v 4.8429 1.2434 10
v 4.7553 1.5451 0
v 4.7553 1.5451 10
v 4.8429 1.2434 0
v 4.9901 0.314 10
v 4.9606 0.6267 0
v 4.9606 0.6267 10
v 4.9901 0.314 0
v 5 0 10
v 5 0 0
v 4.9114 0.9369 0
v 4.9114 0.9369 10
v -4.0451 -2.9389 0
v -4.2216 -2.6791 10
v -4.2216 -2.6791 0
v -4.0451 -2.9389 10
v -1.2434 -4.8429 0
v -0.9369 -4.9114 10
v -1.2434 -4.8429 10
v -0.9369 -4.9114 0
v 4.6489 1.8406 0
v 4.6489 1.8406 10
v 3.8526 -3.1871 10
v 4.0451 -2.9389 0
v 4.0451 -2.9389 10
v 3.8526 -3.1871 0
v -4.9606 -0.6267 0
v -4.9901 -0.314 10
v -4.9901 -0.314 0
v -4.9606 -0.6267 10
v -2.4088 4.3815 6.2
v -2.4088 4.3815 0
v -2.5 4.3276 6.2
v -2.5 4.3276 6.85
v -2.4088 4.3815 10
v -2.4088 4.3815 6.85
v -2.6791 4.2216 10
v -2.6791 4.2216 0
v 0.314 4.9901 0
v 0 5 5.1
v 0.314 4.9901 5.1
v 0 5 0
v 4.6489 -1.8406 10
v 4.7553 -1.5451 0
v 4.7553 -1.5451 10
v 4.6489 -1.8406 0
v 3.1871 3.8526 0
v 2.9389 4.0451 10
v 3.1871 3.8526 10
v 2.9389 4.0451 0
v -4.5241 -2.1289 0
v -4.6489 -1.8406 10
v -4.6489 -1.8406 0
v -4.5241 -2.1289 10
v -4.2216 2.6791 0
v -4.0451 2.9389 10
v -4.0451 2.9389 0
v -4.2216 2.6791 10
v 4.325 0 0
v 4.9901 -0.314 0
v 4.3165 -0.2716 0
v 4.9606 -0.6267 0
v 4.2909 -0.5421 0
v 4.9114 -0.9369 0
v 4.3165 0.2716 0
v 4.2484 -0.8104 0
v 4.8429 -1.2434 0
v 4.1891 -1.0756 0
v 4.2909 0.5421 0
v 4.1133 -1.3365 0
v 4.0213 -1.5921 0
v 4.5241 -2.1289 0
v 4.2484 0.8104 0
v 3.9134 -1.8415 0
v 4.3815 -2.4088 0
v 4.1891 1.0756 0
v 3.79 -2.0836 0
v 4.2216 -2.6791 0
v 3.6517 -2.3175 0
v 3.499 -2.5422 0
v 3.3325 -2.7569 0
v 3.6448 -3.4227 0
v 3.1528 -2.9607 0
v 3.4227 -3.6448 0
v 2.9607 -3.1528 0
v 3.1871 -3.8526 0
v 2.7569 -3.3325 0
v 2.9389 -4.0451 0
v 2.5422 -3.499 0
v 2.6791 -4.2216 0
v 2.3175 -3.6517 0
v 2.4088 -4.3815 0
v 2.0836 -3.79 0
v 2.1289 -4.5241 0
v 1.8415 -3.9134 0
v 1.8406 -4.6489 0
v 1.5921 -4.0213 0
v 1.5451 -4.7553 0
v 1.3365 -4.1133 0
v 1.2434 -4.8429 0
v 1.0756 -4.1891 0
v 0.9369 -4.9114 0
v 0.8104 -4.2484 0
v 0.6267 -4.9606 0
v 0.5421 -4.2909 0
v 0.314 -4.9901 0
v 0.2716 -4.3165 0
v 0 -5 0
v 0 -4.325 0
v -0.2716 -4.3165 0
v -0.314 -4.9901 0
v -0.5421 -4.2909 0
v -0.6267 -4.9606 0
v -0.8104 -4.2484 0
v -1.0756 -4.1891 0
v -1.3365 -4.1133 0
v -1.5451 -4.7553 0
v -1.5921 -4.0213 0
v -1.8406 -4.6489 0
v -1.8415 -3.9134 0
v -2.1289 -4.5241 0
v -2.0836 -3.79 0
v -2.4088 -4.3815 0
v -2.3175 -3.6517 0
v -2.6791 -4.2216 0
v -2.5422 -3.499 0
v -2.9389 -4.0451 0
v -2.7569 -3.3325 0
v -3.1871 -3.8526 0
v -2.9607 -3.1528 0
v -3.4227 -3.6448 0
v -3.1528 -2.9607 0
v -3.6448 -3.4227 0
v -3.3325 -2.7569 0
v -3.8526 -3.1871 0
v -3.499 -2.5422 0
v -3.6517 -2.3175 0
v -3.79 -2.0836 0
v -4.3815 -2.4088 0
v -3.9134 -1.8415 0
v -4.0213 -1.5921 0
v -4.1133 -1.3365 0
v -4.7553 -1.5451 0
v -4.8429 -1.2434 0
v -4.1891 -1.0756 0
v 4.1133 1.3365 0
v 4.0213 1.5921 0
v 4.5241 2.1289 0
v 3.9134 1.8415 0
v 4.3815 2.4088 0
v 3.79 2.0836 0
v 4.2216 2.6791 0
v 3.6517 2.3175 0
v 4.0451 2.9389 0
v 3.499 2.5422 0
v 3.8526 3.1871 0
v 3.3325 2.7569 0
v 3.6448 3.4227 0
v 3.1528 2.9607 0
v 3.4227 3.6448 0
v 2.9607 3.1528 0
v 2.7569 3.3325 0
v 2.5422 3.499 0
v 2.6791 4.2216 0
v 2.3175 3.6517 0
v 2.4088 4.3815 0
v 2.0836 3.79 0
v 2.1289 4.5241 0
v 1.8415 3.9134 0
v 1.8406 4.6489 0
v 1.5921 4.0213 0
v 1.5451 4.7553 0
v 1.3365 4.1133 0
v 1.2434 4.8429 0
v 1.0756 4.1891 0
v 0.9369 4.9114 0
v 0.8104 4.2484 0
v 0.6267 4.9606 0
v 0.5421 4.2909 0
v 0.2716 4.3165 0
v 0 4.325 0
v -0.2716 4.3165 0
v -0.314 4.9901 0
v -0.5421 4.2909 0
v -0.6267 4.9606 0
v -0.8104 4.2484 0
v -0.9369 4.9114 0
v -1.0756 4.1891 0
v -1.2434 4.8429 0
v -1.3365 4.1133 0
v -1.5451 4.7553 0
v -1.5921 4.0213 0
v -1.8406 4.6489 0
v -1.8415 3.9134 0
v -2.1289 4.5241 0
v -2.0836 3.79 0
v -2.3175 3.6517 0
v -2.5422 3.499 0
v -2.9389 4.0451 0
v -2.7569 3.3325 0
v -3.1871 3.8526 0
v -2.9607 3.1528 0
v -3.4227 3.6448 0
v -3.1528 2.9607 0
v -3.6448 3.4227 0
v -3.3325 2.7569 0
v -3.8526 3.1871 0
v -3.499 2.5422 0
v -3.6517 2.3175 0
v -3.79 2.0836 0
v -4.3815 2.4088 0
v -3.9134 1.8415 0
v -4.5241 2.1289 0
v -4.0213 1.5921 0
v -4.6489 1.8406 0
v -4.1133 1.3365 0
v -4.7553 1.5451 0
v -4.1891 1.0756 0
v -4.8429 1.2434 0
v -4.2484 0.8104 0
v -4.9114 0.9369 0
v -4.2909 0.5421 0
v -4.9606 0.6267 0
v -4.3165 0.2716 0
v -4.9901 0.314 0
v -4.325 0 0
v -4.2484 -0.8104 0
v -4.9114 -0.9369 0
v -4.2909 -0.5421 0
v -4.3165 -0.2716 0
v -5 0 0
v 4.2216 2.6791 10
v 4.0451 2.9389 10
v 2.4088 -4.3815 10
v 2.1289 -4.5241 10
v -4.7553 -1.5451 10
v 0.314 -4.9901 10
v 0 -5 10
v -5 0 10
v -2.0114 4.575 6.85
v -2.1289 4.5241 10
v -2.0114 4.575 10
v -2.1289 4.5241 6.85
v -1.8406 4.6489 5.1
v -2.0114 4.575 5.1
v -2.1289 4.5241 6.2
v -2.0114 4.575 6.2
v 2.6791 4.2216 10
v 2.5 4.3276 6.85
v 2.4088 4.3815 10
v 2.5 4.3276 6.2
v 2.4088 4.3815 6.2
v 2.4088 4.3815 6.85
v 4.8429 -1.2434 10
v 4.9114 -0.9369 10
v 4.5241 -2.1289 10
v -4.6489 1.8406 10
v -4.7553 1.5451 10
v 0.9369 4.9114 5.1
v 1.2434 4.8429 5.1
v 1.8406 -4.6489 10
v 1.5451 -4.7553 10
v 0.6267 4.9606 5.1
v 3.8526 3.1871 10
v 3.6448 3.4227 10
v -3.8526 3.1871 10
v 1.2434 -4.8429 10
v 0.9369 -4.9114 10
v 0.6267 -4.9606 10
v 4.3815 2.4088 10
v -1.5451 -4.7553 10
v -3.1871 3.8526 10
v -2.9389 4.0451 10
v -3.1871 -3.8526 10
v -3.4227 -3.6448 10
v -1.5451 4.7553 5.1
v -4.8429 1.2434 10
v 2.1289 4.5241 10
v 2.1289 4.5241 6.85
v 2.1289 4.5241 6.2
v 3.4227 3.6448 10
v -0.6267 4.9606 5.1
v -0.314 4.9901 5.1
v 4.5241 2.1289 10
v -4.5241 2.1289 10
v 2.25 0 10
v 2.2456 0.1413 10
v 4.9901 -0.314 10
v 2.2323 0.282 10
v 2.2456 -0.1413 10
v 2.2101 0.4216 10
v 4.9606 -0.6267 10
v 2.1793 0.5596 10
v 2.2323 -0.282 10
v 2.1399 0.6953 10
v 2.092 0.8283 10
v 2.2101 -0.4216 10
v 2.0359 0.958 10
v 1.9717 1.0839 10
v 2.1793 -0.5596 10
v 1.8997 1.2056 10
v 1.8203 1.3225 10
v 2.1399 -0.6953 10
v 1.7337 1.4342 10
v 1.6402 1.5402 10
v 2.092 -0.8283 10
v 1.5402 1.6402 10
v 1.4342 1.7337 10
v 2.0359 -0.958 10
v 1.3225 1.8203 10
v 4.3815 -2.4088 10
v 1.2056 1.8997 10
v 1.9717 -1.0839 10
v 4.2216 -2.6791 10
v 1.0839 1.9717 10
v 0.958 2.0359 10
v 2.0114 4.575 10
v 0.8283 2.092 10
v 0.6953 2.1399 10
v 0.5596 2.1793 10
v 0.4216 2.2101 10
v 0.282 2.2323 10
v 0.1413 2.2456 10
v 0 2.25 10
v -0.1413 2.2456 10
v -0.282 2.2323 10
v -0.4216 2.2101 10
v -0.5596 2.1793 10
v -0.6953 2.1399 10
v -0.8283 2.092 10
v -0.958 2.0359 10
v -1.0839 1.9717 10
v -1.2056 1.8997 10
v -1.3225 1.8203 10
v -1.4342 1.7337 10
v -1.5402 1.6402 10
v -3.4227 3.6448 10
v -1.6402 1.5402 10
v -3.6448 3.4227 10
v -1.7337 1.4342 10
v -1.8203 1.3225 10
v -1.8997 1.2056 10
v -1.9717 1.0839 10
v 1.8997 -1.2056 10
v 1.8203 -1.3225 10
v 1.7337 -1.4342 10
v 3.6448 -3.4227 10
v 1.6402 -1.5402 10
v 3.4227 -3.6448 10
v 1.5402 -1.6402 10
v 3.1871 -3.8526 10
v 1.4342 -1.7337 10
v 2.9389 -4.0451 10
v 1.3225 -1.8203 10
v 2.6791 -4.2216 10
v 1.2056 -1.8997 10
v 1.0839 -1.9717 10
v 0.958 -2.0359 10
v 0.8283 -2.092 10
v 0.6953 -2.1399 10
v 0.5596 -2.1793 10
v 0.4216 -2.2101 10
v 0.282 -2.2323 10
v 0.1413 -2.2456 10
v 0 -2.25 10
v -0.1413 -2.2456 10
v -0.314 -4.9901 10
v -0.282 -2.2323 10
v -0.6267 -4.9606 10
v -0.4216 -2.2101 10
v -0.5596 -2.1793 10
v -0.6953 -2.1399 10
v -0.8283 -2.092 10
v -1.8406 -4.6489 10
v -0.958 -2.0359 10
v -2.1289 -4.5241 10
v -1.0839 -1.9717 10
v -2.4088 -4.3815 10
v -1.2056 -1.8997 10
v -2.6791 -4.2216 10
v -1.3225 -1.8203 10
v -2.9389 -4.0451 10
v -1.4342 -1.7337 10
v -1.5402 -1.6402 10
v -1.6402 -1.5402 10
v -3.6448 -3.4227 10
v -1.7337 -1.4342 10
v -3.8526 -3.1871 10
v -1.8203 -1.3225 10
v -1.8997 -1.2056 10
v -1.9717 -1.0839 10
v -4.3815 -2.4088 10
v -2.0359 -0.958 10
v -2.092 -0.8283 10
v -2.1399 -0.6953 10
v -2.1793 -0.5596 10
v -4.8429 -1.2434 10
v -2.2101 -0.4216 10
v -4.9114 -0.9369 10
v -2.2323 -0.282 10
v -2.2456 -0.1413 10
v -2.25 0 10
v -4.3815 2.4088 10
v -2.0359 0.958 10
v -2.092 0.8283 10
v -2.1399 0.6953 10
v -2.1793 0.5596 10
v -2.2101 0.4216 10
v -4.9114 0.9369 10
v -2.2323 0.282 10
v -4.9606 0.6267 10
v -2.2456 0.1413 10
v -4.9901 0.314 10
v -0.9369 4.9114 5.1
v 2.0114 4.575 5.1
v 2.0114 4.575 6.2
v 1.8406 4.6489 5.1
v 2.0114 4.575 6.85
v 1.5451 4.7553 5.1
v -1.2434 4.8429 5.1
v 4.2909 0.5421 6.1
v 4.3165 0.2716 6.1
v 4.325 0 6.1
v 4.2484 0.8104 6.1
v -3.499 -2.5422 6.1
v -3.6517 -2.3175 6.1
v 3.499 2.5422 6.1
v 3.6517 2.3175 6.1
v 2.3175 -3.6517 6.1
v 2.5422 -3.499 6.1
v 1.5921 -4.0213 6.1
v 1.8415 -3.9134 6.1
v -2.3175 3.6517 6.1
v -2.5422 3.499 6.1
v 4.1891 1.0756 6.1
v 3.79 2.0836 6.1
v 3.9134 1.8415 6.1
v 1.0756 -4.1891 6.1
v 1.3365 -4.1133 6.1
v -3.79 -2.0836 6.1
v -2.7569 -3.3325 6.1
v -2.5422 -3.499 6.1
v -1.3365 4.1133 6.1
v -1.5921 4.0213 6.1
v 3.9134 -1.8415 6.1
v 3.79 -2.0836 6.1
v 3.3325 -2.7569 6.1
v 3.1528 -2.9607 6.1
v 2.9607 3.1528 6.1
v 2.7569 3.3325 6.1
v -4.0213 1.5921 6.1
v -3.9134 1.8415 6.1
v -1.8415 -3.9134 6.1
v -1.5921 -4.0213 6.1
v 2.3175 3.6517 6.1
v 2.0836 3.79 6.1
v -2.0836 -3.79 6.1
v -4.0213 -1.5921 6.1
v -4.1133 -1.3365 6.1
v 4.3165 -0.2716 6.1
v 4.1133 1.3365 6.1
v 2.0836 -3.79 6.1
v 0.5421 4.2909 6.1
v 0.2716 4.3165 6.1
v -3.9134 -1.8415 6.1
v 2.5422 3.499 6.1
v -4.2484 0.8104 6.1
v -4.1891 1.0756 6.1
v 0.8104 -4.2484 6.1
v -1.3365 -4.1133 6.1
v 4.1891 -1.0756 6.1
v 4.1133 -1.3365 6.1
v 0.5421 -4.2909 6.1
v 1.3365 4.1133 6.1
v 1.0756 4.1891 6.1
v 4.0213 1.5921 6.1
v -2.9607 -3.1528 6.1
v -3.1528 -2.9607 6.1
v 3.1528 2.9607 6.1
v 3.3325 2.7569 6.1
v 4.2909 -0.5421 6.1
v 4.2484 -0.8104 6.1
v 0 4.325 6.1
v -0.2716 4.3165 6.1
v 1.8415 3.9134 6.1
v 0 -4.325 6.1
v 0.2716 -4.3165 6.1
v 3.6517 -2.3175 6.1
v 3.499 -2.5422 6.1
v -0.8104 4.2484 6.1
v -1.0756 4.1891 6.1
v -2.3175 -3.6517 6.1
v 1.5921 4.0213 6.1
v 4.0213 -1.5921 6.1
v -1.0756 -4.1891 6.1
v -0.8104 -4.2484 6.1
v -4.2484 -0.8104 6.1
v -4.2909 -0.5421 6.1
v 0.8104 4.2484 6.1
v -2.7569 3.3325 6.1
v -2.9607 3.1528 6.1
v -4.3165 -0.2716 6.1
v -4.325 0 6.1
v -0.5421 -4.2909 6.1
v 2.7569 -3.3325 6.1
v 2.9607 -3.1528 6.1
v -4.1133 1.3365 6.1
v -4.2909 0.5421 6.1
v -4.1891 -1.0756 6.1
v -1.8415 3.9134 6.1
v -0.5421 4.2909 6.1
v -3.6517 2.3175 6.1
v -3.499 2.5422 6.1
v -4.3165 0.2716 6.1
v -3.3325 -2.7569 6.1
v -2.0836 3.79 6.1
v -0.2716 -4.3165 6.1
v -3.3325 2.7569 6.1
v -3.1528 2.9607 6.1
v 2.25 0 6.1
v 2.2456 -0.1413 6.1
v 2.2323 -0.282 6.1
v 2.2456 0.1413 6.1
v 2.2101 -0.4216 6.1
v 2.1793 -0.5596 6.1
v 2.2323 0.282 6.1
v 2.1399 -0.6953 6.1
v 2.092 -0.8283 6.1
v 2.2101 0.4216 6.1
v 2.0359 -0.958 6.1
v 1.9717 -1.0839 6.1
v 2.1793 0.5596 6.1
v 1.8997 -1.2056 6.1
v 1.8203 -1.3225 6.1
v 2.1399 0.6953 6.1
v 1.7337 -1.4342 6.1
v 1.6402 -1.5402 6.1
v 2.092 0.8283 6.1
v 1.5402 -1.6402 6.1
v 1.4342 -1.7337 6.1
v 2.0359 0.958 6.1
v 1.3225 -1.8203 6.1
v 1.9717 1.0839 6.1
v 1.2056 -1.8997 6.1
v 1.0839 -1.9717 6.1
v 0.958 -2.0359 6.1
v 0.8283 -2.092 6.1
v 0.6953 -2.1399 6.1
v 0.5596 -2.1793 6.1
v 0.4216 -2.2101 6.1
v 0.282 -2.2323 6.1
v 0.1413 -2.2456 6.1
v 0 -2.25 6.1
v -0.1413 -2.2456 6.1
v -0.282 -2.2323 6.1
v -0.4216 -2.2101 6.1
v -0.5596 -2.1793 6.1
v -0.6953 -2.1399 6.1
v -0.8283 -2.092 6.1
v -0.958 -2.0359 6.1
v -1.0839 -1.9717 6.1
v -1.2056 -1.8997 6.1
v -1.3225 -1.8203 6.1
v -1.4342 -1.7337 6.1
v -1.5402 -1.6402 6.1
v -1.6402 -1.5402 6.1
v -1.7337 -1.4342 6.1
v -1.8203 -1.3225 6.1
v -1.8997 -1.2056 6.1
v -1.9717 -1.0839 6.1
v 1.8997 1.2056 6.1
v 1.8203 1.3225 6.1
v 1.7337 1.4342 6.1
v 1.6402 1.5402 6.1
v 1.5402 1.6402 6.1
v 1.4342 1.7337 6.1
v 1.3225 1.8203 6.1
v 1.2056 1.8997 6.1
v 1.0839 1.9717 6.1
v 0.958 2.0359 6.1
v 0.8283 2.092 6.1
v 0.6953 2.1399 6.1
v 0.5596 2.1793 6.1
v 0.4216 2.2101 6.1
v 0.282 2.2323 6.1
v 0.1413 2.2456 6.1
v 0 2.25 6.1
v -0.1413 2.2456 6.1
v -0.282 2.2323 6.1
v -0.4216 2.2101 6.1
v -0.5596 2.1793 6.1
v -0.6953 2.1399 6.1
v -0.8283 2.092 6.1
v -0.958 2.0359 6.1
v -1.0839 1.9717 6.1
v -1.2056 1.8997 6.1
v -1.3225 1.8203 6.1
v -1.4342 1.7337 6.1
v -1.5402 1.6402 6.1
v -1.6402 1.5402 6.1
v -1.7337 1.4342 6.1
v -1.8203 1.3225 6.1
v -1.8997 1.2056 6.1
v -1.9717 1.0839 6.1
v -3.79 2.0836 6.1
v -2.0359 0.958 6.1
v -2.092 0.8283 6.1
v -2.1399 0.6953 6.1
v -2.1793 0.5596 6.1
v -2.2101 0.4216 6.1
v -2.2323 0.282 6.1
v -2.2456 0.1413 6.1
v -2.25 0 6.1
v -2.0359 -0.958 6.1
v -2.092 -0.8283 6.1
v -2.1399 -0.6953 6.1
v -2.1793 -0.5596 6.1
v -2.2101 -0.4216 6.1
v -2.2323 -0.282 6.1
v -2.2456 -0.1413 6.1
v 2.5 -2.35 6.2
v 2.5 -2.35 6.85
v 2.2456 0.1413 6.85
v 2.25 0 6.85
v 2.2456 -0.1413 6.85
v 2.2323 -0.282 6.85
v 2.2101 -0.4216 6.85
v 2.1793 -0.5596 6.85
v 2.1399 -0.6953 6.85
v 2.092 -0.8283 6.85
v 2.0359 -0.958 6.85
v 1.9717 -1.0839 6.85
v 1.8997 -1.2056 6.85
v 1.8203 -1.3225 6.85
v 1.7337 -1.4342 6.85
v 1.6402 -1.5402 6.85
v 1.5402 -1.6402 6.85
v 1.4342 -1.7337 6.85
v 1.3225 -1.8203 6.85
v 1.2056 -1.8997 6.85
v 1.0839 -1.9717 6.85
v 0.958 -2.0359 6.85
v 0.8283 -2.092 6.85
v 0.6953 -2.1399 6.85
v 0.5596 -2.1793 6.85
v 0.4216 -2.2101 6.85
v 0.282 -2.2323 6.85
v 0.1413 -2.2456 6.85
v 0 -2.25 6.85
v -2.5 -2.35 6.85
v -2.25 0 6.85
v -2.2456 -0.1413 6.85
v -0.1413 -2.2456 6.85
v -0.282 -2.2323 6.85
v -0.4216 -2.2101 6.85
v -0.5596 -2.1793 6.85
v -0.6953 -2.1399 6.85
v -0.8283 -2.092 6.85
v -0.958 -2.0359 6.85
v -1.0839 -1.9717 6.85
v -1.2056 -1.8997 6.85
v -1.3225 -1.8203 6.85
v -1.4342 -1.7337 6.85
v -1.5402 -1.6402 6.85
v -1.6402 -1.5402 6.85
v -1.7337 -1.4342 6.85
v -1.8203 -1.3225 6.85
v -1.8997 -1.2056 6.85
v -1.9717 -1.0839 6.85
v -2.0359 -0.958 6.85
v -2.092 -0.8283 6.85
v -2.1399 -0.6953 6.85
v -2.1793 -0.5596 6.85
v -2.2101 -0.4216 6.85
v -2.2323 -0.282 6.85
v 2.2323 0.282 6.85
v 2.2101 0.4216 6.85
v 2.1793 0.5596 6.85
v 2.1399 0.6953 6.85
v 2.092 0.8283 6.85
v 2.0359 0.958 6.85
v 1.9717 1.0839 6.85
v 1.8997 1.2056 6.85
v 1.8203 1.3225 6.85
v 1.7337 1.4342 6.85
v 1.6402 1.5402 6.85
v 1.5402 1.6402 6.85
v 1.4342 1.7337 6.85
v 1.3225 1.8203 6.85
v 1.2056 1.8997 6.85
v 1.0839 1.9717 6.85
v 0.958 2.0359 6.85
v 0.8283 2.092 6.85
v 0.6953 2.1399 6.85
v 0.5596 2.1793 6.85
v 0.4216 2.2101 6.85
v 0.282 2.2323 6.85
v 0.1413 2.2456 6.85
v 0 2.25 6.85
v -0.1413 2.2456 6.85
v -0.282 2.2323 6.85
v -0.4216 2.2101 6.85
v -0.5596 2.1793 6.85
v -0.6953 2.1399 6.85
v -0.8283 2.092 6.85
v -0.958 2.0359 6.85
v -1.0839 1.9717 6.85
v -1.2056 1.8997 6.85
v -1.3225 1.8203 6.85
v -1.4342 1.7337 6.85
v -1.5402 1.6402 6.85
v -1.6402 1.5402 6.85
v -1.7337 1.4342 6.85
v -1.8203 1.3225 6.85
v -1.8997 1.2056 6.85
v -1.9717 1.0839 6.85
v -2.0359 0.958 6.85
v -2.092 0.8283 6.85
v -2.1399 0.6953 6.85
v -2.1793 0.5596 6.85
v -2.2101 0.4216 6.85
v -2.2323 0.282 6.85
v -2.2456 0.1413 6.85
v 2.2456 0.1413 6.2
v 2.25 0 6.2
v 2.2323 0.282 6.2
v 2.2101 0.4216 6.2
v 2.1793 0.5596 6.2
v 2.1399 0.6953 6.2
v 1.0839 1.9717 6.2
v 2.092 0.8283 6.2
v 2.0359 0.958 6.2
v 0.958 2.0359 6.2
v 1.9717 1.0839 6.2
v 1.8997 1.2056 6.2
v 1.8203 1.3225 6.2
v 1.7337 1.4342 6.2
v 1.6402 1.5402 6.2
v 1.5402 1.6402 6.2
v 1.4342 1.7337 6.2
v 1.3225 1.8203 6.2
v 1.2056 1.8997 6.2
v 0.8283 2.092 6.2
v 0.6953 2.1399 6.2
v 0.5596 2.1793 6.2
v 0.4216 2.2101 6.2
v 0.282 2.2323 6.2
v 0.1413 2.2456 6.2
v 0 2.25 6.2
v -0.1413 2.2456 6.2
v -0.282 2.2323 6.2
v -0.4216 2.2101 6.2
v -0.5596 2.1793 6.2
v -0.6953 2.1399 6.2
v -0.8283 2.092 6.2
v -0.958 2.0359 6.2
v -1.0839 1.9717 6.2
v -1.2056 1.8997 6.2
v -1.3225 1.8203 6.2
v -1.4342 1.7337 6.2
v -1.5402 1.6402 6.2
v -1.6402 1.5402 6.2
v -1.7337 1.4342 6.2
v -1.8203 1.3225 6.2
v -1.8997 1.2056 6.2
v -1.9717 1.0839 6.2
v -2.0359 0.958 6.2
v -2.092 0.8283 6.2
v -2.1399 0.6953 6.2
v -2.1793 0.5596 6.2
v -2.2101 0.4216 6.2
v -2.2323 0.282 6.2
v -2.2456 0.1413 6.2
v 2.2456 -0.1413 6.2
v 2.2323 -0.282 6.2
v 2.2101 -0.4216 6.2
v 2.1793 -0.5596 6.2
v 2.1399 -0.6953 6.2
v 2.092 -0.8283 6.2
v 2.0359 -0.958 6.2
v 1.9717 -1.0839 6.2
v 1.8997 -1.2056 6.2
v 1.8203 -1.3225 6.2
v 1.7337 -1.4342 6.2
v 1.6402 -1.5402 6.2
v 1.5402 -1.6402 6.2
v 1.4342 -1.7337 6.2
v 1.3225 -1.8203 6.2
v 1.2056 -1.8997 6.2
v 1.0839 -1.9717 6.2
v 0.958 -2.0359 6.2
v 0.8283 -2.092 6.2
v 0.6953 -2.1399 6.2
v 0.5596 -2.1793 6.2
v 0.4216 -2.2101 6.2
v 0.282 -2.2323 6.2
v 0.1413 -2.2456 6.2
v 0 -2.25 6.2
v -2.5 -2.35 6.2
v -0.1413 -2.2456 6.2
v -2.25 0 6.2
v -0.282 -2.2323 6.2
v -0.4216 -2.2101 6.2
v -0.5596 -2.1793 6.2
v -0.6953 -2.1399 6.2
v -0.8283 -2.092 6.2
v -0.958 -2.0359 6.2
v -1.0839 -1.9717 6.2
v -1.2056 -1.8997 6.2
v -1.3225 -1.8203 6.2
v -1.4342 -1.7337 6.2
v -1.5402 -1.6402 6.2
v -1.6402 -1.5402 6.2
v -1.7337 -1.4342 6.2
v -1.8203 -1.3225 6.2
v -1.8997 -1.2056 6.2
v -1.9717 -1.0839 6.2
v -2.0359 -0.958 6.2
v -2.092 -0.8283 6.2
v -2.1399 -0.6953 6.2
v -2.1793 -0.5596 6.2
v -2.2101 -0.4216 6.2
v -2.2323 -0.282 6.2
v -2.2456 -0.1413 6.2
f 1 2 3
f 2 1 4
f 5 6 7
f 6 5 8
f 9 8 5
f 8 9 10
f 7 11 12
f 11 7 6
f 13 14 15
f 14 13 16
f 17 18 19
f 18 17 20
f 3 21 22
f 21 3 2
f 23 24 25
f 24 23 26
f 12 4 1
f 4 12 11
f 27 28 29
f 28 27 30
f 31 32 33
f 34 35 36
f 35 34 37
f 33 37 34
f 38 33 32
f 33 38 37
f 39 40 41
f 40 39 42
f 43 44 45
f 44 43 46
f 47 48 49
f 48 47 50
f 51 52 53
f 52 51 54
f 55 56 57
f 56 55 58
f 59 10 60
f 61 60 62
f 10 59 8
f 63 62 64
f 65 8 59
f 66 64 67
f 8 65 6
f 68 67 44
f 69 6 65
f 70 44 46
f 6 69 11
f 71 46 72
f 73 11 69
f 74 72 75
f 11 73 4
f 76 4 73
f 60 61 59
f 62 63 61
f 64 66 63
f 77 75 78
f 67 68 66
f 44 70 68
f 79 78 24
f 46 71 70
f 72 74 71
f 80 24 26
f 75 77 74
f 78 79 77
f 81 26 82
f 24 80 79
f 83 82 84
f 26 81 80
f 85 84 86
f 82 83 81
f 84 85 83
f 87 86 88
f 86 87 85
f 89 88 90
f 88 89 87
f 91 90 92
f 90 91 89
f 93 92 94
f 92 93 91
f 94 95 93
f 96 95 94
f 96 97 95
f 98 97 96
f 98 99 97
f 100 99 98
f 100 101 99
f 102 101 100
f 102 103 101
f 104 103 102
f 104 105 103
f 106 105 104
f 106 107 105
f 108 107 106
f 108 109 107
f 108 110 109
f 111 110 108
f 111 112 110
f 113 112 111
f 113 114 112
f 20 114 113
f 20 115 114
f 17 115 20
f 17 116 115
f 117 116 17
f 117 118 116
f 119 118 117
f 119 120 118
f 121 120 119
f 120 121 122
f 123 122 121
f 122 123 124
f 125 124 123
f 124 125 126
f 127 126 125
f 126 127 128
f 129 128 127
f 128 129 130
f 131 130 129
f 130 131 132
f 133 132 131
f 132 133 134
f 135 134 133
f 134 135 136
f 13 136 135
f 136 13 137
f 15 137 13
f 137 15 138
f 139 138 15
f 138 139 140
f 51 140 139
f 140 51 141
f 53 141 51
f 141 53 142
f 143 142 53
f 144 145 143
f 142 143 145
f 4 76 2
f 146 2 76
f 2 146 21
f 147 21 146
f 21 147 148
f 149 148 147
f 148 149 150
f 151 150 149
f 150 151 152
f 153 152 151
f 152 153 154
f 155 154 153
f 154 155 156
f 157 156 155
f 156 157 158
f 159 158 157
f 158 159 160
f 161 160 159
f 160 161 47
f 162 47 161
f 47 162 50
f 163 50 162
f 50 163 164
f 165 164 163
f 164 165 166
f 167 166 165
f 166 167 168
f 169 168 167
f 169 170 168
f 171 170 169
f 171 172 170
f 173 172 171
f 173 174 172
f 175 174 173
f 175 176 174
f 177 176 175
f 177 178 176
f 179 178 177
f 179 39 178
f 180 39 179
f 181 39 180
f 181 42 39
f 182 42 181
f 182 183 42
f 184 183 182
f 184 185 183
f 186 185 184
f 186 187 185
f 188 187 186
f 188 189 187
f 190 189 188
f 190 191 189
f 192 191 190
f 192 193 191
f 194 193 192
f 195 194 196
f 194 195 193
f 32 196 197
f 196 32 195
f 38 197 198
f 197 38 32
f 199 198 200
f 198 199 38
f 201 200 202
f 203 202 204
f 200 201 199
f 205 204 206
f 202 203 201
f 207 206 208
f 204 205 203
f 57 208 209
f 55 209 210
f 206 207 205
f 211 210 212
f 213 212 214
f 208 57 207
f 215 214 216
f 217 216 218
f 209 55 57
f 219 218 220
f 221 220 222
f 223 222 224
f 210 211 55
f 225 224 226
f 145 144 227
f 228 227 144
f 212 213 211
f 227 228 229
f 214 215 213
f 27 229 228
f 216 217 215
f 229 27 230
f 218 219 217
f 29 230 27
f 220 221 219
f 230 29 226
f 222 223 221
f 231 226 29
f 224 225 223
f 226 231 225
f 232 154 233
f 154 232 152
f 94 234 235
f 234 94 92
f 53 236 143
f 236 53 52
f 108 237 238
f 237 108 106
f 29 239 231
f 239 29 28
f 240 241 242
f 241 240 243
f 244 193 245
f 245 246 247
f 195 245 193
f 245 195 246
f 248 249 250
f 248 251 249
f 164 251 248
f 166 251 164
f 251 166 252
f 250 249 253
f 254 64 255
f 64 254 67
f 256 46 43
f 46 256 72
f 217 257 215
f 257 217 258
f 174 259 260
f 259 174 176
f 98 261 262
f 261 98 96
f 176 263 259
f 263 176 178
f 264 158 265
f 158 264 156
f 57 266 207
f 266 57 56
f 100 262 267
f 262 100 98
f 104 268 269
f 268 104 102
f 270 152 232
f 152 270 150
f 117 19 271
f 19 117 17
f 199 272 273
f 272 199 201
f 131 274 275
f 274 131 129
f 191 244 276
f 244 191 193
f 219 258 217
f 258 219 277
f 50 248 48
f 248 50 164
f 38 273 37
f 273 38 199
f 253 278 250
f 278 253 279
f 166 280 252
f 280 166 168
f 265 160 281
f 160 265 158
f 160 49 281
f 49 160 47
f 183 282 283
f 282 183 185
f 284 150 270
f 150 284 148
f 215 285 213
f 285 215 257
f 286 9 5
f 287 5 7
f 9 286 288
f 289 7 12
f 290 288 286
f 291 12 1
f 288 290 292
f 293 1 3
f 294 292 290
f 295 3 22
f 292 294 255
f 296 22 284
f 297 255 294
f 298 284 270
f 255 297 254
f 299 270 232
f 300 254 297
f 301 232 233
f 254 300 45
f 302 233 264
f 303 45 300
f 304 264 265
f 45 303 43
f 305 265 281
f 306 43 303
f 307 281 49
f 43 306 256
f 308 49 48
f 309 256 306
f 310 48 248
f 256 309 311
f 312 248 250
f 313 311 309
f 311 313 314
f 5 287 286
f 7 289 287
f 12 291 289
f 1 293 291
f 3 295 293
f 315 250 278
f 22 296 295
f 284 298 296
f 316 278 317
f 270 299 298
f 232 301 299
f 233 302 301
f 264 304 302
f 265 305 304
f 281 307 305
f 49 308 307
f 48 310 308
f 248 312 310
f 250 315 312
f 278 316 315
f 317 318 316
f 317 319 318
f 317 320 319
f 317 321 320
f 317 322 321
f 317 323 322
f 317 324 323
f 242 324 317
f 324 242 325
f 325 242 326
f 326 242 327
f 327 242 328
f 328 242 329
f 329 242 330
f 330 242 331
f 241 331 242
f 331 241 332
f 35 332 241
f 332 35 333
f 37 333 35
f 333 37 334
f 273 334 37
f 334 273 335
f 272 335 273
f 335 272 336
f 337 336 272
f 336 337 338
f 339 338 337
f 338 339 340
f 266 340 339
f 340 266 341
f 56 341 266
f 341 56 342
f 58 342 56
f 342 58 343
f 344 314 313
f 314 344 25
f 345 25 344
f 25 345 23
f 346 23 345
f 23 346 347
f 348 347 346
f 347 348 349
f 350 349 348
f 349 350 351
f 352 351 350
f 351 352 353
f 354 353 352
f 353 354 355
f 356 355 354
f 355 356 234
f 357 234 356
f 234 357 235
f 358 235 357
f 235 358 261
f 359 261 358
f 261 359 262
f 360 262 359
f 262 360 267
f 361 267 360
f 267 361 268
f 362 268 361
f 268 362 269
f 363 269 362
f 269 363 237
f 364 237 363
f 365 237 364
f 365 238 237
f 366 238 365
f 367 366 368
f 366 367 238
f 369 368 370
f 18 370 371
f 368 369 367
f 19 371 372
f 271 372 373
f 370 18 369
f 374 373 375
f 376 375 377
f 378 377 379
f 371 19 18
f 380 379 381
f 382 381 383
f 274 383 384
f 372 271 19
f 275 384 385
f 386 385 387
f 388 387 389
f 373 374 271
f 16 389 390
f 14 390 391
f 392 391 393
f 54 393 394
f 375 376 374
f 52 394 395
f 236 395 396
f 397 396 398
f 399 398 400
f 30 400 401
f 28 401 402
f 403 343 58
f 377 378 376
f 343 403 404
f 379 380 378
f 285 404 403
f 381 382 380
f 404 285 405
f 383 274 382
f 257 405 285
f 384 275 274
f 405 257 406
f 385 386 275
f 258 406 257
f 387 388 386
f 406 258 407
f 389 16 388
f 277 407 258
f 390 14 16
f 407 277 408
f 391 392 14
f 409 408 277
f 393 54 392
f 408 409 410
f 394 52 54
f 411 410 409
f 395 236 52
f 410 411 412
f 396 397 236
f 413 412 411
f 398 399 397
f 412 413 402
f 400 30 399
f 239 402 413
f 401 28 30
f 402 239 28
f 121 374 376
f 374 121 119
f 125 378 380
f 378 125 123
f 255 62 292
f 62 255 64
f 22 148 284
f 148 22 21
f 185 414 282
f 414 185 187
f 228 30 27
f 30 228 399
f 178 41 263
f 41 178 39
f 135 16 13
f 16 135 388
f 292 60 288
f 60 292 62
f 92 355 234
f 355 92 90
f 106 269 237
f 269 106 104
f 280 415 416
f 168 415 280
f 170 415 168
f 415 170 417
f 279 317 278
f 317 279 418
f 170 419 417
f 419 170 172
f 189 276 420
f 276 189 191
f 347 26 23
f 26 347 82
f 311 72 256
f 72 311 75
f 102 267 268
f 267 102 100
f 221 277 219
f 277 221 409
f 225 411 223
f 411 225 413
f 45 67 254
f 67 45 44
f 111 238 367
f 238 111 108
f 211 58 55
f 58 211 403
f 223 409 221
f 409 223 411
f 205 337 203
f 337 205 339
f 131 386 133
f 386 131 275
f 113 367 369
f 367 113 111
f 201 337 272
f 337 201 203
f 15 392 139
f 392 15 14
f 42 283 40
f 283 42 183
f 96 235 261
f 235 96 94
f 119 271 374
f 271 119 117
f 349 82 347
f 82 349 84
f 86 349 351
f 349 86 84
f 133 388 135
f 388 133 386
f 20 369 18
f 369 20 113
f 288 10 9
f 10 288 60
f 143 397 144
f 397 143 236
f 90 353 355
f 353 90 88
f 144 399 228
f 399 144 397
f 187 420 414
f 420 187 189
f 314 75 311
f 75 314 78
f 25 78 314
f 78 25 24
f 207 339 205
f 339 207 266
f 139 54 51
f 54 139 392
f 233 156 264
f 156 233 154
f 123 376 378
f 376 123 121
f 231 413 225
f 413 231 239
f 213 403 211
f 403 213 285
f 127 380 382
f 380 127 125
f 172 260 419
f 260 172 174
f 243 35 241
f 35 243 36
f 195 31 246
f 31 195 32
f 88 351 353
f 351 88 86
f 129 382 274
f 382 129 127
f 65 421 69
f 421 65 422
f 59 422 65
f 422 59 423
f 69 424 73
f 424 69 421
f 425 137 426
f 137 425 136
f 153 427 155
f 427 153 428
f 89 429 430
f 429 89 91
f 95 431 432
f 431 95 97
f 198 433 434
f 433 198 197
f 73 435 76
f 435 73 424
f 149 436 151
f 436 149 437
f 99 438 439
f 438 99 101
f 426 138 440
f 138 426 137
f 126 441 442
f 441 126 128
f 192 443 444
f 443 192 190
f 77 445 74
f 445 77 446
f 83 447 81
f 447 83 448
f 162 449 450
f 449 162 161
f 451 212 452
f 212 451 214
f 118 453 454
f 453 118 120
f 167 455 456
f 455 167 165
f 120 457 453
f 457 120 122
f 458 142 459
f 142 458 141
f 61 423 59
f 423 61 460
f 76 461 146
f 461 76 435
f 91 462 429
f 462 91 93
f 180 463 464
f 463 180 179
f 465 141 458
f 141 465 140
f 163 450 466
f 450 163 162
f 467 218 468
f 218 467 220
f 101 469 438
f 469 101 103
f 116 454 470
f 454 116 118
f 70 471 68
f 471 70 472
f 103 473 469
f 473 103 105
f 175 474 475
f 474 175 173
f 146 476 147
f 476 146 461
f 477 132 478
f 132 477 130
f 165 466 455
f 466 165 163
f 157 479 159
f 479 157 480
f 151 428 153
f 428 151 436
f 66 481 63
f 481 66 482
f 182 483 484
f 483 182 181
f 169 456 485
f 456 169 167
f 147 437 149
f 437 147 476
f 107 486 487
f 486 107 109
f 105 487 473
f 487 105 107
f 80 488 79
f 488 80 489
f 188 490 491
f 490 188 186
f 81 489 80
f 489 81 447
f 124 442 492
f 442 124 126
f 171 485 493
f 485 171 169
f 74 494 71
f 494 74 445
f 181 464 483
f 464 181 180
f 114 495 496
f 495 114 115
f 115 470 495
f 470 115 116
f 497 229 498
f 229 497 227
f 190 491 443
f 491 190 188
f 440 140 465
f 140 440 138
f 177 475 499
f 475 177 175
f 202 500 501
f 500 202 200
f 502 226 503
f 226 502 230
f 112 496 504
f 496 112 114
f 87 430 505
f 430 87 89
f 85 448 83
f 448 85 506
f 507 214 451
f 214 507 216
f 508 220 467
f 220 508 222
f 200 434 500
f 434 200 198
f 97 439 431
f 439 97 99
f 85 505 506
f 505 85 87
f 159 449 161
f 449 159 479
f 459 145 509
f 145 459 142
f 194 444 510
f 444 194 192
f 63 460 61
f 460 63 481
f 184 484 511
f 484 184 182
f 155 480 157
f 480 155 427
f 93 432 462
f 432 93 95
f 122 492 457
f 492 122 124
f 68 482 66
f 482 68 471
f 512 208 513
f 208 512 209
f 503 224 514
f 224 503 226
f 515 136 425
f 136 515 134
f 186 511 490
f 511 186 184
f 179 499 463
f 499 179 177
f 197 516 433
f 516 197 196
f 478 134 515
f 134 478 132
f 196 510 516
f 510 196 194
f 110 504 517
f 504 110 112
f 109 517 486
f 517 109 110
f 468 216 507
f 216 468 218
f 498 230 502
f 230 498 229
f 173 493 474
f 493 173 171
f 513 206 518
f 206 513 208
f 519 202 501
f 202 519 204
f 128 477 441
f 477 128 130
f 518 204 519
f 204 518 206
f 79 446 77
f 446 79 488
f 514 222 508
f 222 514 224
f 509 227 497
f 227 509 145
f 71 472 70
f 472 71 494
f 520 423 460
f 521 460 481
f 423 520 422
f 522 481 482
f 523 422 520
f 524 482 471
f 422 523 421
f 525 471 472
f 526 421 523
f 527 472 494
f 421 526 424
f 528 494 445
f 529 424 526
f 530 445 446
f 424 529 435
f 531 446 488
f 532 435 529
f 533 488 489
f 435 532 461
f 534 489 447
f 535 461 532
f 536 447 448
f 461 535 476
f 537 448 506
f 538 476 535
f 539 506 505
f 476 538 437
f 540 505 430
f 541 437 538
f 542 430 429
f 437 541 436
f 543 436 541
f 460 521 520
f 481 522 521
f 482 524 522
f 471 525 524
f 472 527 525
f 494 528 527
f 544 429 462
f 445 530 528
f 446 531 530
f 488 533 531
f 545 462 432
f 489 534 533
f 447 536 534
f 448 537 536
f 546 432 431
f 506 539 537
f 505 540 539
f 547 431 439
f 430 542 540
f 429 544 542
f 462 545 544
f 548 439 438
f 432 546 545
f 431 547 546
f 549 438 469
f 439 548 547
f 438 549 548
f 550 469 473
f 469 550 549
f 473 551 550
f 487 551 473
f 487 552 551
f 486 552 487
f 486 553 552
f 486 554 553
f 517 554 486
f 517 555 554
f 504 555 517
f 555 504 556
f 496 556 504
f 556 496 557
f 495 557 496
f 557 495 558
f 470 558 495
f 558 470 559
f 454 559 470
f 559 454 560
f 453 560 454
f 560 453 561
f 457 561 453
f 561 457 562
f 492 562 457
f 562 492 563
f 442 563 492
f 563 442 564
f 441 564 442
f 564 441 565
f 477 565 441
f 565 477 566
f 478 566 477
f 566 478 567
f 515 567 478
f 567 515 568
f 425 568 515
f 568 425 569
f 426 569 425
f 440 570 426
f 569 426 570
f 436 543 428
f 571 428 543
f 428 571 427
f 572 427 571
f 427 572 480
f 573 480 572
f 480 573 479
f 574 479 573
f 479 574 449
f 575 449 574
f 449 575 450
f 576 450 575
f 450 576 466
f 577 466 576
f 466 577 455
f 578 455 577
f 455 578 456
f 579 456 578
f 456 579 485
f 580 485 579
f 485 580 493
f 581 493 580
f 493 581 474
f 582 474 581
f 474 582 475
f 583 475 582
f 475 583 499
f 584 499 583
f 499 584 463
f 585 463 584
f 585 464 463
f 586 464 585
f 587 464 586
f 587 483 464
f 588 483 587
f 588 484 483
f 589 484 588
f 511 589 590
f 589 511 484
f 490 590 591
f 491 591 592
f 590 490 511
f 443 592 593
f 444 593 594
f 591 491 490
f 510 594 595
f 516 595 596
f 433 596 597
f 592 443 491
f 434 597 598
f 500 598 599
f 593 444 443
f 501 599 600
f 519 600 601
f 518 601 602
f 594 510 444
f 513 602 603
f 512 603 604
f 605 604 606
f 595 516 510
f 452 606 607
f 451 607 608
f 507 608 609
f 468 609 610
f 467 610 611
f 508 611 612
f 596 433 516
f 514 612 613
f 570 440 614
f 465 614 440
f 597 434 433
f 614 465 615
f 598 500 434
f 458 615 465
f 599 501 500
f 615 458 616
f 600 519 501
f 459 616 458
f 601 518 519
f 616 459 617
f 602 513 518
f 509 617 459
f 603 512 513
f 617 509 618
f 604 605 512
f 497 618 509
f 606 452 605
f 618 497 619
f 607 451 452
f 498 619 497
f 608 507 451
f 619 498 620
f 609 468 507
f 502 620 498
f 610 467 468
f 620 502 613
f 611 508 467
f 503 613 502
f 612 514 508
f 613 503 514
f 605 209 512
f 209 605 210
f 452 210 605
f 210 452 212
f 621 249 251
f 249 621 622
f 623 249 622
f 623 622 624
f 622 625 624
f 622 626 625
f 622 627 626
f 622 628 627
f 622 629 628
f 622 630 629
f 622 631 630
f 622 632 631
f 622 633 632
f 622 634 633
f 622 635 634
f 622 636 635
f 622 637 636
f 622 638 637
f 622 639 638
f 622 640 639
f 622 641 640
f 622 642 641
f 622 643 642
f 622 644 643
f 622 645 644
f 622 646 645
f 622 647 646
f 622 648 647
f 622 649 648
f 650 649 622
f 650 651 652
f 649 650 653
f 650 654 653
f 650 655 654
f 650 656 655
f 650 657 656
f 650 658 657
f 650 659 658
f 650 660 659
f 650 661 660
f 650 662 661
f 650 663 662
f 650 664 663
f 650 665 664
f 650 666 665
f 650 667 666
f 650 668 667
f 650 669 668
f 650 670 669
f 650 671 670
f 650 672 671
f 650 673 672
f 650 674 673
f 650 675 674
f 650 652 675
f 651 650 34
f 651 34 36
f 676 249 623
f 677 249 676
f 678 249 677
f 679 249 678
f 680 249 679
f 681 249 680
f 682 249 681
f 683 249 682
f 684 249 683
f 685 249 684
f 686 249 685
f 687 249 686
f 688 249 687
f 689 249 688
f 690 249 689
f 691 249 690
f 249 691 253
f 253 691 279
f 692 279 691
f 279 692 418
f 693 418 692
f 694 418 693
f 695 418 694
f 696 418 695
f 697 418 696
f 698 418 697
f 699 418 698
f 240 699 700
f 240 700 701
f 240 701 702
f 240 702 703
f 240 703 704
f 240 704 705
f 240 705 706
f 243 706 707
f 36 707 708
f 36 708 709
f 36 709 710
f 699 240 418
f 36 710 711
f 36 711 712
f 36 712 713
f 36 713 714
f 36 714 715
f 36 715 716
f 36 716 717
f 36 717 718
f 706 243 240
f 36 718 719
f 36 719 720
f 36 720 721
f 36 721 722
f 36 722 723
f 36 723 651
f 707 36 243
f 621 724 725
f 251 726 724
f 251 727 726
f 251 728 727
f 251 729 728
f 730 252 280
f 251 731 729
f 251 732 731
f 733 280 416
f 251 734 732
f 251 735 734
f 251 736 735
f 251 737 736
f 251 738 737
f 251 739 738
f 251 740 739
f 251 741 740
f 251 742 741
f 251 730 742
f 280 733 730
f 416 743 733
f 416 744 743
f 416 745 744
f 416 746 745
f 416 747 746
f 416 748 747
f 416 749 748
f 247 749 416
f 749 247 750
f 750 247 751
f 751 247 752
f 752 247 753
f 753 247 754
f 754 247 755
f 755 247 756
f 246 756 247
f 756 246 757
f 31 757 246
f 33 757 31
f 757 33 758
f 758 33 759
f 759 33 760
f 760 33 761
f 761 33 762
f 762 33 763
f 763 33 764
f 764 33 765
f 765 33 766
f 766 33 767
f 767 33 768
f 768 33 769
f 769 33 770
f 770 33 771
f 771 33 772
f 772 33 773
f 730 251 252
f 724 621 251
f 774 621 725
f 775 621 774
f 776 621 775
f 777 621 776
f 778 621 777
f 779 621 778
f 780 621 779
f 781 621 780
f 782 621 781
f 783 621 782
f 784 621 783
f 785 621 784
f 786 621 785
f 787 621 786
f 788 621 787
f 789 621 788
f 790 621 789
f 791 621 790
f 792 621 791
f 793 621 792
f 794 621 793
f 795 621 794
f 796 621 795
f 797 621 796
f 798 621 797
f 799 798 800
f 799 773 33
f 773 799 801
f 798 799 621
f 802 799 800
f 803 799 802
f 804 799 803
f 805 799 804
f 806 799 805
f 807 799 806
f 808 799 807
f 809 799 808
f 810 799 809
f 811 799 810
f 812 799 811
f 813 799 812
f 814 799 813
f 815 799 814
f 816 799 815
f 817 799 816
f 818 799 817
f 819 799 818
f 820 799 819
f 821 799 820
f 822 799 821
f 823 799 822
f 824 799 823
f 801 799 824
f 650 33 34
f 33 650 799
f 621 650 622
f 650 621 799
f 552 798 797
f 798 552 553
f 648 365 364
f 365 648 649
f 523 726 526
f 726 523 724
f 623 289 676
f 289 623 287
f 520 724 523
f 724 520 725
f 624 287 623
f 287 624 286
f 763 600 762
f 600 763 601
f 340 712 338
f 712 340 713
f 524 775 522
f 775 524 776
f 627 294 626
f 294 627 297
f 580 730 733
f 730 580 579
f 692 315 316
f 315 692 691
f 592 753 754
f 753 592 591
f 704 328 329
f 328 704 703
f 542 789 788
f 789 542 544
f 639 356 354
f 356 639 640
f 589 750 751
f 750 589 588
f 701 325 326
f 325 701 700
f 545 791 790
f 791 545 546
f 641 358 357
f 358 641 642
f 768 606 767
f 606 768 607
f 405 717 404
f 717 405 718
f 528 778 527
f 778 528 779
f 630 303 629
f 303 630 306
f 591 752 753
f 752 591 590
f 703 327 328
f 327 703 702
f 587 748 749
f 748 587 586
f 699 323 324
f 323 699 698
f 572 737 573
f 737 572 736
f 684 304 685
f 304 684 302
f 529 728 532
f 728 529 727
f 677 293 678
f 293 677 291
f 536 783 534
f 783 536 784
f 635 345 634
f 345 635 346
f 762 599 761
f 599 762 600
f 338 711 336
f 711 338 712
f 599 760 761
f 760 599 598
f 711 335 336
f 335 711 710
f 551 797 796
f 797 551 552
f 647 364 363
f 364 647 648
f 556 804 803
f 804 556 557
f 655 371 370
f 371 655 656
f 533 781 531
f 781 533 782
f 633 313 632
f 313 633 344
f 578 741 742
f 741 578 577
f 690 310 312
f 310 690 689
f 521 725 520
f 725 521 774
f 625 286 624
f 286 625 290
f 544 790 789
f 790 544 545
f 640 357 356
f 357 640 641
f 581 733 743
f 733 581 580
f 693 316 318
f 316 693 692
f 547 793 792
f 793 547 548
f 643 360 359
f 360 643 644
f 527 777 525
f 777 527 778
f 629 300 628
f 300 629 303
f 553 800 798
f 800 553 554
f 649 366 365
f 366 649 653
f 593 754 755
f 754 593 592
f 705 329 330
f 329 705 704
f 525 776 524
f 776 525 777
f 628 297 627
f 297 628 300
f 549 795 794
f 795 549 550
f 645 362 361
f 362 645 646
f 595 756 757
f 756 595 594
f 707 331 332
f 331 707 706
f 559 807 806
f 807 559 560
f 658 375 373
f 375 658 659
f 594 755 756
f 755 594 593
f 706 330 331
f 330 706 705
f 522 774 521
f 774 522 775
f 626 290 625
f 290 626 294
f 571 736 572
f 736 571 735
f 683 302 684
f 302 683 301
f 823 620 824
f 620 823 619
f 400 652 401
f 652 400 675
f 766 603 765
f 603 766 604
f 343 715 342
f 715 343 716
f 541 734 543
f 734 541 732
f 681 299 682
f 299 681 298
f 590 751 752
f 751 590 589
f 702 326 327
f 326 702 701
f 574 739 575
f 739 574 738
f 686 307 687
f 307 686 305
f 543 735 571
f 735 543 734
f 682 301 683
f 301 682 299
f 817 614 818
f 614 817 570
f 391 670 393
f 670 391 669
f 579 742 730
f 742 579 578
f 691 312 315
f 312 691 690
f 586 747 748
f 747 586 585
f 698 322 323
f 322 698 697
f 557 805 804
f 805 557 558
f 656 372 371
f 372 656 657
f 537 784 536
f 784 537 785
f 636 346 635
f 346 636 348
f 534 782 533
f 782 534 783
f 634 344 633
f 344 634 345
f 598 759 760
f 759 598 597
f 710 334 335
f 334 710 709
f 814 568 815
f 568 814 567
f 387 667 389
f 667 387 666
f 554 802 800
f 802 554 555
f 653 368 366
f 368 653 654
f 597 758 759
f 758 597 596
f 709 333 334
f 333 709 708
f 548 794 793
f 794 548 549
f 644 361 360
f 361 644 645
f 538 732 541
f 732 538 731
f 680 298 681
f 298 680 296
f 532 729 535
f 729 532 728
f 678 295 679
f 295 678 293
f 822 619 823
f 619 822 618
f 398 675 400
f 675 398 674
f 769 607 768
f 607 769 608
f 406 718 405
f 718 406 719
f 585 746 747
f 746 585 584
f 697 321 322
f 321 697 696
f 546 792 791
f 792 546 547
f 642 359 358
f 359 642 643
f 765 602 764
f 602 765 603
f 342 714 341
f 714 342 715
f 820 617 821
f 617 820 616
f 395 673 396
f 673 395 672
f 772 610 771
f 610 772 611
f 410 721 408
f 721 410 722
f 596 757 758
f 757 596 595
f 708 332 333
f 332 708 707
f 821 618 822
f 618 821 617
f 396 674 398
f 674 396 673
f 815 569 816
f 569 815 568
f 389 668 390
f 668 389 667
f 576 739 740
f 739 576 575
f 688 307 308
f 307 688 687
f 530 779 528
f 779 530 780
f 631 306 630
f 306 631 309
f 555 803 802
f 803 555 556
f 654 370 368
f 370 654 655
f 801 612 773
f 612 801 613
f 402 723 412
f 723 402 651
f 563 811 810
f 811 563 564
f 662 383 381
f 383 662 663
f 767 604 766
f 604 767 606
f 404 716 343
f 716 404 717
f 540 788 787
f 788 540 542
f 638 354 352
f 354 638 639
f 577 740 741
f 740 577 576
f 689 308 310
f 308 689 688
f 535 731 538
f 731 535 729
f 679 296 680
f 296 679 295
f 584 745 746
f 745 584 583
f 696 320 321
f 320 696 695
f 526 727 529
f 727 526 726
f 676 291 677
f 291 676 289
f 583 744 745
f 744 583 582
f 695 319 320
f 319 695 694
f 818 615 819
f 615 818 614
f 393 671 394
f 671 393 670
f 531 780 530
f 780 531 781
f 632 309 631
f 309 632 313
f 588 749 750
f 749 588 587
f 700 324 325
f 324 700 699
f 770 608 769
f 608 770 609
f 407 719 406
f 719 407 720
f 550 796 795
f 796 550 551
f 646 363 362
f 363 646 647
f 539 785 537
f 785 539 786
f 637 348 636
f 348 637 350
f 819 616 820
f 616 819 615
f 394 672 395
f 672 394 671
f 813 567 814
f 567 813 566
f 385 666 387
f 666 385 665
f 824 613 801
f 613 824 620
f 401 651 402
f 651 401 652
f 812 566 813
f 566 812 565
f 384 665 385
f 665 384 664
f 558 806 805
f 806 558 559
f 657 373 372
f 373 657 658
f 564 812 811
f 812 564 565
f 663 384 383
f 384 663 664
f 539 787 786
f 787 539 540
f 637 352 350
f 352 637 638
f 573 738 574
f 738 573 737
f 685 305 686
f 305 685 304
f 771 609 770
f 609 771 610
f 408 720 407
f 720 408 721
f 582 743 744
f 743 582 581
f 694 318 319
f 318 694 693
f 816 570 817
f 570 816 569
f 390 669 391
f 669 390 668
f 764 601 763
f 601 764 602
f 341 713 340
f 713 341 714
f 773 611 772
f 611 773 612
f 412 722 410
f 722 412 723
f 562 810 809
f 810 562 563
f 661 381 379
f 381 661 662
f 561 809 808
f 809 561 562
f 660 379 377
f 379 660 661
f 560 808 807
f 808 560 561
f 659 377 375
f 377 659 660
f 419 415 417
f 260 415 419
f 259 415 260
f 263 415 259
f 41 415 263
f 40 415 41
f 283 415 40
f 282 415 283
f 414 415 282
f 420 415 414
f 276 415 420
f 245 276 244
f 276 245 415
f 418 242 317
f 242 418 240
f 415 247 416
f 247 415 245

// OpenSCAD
module sensor_filter_bracket(module_height = 5,
                             total_height = 8,
                             outer_radius = 5,
                             inner_radius = 2,
                             filter_height = 0.1,
                             filter_width = 5,
                             viewport_width = 3.5) {

    difference() {
        // This is the main cylinder
        cylinder(h=total_height, r=outer_radius, center=false, $fn=100);
        
        // Remove a cutout for the sensor module
        translate([0, 0, -0.01]) {
            cylinder(h=module_height + 0.01, r=inner_radius, center=false, $fn=100);
        };
        
        translate([0, 0, module_height-0.01]) {
            cylinder(h=total_height - module_height + 0.02, r=2, center=false, $fn=100);
        }
        
        // Remove a cut out for the filter
        translate([-filter_width/2, (-viewport_width-0.1), module_height+0.1]) {
            cube([filter_width, outer_radius*2, filter_height]);
        };
        
        // Remove a wider cutout from the top for imaging
        translate([0, 0, module_height - 0.01]) {
            cylinder(h=(total_height - module_height + 0.02), r=viewport_width, center=false, $fn=100);
            //cylinder(h=(total_height - module_height - 0.48), r1=(2), r2=(outer_radius - 1), center=false, $fn=100);
        };
        
        // Remove a wider cutout from the side for filter insertion and removal
        translate([-outer_radius, (inner_radius+0.25), (module_height-1)]) {
            cube([outer_radius*2, outer_radius, (total_height - module_height + 1.1)]);
        }
    }   
}

sensor_filter_bracket(module_height = 6.1,
                                            total_height = 10,
                                            outer_radius = 5,
                                            inner_radius = 8.65/2,
                                            filter_height = 0.65,
                                            filter_width = 5,
                                            viewport_width = 2.25);
